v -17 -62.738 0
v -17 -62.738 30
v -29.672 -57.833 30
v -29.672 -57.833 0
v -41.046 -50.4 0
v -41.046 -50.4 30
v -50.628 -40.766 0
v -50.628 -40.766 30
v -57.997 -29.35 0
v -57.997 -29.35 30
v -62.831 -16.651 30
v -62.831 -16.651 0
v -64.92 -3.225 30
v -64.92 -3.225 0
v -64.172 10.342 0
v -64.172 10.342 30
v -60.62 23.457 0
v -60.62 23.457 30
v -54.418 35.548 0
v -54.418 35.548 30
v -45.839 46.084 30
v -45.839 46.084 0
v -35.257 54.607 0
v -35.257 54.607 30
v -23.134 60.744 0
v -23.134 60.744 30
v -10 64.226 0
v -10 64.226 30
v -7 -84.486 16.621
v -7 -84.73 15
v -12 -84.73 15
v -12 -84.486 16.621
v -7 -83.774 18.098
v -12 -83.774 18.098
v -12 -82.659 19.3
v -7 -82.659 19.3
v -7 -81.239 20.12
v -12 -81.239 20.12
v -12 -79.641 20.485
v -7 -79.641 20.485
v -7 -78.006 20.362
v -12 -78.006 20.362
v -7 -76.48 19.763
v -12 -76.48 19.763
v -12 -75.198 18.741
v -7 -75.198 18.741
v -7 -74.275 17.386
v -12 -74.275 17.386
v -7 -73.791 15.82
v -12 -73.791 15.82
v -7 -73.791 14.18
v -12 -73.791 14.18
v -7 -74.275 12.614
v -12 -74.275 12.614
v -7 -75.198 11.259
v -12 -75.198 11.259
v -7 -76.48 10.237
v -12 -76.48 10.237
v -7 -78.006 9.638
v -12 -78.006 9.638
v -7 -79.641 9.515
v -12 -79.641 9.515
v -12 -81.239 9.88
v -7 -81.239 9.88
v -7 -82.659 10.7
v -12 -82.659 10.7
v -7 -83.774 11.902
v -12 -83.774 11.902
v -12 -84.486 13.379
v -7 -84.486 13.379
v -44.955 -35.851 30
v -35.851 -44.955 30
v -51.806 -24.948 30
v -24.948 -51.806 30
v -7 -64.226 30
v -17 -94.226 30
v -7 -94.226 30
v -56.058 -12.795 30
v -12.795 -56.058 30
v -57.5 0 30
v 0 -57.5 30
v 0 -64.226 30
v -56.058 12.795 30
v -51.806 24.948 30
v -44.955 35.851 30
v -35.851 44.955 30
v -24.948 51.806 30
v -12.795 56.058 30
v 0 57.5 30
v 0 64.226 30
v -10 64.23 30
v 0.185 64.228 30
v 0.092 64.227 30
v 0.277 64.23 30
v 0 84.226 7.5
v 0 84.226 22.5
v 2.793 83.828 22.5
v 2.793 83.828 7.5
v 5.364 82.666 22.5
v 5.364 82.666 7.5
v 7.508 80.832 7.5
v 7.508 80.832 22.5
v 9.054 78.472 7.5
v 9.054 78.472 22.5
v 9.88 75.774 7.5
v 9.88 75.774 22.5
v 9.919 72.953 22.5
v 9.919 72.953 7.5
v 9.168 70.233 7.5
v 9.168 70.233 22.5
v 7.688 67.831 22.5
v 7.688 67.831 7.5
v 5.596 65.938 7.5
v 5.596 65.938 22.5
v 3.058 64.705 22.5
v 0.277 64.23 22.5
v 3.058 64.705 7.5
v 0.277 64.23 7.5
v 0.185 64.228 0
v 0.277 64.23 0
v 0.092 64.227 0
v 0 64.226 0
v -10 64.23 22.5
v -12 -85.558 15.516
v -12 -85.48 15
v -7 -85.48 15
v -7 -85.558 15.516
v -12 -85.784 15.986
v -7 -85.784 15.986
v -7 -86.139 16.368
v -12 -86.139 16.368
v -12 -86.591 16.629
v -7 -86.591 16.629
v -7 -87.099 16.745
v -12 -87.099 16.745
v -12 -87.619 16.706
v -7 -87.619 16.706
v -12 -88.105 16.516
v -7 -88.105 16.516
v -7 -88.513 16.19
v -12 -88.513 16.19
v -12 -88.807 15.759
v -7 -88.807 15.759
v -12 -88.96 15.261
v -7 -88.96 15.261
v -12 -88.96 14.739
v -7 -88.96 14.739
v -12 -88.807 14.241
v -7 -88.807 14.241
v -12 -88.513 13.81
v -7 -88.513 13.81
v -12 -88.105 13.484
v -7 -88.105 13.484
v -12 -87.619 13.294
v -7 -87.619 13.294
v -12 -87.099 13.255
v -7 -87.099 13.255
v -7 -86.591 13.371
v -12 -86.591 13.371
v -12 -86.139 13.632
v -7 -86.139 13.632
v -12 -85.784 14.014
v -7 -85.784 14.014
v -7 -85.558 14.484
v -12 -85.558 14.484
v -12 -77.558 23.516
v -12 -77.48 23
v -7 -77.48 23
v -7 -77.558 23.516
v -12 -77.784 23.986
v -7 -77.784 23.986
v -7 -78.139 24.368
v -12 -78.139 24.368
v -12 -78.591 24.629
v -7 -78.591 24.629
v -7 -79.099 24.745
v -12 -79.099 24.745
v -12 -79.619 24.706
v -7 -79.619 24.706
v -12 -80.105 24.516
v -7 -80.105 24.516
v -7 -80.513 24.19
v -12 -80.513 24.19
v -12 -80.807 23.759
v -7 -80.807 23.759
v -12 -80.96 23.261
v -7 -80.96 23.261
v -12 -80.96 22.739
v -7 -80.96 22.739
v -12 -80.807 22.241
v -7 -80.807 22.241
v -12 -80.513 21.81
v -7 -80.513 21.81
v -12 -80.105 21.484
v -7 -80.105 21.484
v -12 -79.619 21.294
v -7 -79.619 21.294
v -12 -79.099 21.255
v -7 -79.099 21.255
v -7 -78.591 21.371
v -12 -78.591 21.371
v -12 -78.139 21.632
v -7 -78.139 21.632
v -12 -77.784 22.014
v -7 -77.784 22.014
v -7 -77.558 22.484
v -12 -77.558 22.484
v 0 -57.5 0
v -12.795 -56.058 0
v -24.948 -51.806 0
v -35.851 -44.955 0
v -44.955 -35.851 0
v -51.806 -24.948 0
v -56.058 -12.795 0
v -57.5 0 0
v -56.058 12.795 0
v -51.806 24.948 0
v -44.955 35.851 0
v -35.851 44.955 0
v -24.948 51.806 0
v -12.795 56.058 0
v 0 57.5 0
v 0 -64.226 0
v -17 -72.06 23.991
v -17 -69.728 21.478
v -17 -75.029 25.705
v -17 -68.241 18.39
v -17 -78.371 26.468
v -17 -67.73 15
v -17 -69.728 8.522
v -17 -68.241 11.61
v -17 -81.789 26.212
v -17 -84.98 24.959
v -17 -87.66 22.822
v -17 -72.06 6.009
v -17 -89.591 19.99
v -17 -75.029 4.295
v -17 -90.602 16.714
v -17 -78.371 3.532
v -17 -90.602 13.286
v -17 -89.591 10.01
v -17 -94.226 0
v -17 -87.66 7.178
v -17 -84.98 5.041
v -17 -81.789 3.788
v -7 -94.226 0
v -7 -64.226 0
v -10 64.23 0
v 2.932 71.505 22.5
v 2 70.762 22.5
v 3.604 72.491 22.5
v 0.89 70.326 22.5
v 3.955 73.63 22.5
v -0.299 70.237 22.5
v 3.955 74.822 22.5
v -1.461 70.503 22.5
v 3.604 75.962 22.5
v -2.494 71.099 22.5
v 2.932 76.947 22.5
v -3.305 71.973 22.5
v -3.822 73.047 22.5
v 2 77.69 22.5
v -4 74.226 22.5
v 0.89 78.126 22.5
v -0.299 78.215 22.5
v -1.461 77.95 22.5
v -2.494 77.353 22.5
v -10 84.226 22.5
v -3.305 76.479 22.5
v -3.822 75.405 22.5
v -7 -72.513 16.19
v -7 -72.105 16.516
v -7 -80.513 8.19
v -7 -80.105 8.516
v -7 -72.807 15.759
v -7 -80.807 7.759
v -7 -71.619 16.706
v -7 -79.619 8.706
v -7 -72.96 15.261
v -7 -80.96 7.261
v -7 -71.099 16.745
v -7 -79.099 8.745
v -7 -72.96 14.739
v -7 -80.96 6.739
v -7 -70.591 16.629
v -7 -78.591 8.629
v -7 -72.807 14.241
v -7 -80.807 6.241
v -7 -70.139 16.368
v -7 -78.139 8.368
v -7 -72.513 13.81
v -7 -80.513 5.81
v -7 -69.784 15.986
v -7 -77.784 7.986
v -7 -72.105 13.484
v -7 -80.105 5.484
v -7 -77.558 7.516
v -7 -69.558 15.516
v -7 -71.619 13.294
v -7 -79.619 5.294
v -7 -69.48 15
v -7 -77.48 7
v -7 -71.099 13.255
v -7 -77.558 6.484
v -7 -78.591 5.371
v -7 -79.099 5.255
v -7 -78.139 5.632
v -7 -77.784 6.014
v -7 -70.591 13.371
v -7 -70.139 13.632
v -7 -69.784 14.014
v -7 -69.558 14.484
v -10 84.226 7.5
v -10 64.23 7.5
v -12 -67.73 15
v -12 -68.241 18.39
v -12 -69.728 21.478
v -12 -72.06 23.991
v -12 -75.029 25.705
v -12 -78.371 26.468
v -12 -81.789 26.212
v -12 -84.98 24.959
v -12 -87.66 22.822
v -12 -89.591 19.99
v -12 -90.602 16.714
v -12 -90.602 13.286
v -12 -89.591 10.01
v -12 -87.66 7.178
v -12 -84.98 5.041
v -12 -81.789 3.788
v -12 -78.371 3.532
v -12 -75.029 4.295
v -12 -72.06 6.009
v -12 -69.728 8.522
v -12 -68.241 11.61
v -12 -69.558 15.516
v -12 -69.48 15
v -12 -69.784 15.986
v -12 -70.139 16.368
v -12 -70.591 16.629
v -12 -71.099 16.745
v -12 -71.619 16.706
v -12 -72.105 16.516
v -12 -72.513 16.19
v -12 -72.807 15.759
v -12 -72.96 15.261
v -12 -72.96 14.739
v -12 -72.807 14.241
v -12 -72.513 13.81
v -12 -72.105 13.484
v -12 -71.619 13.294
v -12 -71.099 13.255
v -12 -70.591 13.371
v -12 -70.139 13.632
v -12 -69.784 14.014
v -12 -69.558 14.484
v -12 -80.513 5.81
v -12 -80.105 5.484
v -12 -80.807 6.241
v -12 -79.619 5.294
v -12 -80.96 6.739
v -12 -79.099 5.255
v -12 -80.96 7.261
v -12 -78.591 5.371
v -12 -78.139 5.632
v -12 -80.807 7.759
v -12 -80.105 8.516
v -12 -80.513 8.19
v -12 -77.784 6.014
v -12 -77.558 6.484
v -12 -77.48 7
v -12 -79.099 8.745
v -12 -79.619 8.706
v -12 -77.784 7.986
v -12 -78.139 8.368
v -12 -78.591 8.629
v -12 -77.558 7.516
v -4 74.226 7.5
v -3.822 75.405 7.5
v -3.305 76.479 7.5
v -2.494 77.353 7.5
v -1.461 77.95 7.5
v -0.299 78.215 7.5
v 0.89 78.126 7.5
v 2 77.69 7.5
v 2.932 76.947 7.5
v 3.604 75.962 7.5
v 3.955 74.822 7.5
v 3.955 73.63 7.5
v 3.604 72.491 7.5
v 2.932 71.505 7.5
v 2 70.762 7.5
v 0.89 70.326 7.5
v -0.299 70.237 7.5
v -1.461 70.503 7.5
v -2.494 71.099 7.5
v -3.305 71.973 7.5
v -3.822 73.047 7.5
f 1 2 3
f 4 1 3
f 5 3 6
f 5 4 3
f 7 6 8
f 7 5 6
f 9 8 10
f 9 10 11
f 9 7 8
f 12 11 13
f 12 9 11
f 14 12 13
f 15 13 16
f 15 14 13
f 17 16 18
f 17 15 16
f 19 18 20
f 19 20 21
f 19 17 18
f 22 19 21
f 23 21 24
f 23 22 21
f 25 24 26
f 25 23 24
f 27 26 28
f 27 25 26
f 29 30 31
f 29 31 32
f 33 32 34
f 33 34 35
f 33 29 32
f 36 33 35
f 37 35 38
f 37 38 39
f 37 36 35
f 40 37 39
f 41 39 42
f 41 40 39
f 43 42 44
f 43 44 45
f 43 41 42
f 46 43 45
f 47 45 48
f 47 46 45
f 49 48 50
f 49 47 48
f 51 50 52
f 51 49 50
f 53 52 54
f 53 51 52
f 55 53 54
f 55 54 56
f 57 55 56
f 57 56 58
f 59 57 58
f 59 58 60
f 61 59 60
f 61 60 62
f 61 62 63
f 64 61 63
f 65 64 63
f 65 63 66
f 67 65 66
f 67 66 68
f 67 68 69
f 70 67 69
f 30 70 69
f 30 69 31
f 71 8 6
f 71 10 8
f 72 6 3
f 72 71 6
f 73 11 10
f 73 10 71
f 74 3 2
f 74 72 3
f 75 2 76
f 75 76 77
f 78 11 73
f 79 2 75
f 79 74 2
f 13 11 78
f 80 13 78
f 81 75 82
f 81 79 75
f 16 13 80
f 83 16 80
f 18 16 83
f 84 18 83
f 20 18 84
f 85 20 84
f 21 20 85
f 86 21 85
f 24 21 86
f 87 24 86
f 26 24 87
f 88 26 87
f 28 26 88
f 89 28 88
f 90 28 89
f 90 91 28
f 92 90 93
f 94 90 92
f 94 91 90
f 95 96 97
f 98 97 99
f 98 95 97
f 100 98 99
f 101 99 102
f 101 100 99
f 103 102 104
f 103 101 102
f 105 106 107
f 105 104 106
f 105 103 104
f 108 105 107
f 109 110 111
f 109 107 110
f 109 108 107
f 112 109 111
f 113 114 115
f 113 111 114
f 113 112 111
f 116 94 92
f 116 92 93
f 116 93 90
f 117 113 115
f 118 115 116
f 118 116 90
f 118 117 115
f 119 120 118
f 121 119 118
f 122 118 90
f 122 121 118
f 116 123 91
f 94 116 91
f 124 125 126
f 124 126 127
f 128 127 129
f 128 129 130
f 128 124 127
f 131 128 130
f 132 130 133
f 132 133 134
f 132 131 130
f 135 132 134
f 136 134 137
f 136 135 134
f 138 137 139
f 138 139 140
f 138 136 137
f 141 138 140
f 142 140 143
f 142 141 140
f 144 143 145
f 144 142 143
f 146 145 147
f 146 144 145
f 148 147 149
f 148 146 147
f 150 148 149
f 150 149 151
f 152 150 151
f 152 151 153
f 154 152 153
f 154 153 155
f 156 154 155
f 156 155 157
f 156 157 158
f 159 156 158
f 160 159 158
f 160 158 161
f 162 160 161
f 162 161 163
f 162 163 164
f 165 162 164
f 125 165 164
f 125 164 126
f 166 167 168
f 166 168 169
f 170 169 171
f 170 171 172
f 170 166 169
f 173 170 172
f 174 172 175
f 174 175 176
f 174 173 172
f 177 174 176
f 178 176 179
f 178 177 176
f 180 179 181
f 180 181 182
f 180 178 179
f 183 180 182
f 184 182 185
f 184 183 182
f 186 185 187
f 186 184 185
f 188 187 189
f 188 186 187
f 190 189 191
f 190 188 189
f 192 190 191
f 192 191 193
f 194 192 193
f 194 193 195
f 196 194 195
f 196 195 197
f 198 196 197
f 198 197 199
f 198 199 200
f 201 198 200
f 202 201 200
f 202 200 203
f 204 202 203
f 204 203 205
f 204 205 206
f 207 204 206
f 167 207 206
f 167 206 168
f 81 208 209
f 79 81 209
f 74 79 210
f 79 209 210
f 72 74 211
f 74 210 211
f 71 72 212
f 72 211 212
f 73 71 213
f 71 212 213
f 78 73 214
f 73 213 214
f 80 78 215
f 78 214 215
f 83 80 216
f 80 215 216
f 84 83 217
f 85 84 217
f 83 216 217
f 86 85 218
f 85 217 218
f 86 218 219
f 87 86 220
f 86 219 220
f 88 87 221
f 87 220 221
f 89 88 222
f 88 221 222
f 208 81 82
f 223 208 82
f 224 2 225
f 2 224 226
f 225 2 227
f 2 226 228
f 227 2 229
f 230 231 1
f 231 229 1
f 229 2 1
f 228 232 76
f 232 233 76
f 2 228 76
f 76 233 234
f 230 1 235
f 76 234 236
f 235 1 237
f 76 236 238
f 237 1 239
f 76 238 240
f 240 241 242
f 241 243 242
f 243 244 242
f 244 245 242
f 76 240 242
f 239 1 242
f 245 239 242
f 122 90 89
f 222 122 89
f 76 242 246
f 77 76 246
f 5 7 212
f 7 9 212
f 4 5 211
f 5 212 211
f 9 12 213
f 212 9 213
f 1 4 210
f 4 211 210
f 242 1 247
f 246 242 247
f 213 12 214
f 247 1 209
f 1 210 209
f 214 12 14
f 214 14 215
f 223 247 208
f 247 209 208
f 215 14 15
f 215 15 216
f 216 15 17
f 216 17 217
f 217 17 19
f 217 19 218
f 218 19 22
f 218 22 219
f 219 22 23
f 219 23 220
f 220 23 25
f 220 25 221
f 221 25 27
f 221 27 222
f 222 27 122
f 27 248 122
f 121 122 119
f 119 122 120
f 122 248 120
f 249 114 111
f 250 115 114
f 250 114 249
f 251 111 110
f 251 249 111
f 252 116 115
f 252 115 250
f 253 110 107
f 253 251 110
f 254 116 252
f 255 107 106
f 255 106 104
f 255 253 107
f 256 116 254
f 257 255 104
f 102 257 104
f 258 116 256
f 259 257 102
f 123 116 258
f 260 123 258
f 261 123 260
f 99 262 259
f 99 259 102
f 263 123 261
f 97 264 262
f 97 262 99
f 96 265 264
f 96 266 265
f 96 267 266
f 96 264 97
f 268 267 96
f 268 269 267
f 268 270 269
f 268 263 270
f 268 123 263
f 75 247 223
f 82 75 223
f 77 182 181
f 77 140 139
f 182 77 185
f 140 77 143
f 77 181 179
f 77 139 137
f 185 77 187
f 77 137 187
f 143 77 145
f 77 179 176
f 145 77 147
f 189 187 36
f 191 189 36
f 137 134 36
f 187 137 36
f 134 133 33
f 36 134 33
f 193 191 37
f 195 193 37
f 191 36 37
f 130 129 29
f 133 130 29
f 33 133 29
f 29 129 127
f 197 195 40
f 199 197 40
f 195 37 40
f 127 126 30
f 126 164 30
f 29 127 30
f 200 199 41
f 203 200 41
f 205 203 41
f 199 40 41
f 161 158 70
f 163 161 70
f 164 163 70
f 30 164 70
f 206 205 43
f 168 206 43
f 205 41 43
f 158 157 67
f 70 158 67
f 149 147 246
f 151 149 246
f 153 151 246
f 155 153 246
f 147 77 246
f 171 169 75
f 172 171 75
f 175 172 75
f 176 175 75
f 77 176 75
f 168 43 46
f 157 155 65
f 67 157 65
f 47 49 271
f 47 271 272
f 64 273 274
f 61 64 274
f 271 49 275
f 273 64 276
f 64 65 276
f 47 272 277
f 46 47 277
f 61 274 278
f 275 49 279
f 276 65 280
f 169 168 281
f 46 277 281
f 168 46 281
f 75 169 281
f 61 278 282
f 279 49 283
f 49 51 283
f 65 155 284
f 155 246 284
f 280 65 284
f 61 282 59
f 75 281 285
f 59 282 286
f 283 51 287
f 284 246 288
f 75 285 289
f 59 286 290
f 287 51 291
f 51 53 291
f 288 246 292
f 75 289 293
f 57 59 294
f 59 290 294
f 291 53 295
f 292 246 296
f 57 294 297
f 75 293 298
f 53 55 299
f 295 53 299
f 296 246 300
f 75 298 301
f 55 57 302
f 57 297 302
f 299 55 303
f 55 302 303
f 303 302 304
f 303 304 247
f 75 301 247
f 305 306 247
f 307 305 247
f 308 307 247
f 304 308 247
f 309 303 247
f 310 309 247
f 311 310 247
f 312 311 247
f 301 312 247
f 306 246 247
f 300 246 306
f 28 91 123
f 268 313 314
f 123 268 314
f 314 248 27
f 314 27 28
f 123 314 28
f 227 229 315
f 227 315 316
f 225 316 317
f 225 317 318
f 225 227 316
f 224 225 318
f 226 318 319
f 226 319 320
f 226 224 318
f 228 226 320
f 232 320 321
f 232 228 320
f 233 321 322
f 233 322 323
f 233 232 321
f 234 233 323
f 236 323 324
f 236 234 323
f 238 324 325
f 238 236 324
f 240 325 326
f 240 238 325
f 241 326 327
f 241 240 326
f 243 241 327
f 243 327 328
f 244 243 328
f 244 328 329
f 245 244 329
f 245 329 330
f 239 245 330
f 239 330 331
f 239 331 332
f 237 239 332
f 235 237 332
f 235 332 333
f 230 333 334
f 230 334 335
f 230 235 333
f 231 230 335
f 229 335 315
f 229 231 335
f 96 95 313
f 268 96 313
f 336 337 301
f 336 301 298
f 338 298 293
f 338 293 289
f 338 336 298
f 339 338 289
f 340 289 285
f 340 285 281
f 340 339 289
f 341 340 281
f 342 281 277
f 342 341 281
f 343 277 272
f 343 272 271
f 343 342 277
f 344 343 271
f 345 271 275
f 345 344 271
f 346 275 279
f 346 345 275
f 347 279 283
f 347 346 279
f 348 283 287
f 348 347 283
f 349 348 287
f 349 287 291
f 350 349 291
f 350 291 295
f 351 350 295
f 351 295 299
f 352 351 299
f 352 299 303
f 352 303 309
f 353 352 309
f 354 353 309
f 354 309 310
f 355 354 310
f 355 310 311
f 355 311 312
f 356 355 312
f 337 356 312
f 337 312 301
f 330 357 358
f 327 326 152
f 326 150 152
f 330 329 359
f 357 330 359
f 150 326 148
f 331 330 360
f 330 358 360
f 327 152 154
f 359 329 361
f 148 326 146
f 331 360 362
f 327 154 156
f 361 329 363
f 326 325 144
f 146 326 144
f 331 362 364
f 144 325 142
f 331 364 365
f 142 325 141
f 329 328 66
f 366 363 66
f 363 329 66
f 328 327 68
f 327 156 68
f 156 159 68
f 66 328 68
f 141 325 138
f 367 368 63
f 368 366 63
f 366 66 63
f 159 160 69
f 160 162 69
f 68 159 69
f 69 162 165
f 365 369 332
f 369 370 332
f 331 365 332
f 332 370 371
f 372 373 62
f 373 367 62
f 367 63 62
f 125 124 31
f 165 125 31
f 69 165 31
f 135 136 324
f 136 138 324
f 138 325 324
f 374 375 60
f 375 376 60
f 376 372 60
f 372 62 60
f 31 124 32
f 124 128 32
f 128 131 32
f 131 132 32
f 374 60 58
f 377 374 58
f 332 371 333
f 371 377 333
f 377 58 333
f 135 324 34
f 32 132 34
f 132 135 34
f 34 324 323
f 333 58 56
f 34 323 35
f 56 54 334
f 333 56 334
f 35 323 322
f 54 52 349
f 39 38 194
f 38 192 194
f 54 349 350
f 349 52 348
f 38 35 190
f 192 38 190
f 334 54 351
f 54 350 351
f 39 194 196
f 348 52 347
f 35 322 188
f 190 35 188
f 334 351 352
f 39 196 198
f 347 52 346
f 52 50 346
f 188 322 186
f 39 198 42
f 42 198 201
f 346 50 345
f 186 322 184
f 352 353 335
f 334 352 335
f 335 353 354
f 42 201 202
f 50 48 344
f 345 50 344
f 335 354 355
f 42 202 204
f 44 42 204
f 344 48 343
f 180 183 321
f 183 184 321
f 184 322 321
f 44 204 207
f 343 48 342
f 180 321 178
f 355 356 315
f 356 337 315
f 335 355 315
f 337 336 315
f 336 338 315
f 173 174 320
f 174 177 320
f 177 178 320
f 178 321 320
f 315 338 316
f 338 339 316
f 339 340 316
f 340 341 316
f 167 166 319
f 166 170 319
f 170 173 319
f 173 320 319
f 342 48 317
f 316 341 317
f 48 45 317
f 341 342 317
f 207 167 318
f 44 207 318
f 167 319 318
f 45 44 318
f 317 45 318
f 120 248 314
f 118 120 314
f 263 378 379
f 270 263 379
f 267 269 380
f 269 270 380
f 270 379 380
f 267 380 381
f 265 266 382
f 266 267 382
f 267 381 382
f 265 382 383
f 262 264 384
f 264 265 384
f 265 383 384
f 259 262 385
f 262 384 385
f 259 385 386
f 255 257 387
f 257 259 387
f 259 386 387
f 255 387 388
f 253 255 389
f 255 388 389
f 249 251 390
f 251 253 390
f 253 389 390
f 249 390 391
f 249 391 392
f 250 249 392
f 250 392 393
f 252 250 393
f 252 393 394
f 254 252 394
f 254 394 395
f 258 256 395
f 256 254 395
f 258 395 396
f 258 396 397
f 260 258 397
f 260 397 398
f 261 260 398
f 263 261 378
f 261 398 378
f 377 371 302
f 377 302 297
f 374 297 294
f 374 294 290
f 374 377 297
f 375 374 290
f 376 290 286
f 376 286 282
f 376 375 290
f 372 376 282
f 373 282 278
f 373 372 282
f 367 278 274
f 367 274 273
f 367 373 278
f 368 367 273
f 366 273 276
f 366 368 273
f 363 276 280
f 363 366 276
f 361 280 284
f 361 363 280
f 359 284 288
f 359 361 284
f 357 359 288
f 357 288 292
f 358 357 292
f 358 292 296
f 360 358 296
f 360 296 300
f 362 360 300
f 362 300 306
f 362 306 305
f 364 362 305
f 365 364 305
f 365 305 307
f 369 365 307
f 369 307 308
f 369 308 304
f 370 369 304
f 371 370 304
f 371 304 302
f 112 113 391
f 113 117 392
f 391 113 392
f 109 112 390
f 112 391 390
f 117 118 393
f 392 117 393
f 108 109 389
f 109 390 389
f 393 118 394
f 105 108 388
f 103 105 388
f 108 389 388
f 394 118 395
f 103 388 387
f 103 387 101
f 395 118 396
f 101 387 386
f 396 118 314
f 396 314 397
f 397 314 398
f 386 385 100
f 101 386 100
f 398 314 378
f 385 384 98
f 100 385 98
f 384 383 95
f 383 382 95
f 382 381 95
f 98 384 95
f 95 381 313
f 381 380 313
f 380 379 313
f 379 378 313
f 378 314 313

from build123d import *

# Parameters (mm, degrees)
SKETCH_R        = 4
PAD_DEPTH       = 30
SKETCH001_R     = 5.5
POCKET_DEPTH    = 10
SKETCH002_R     = 11.5
POCKET001_DEPTH = 5
SKETCH003_R     = 1.75
POCKET002_DEPTH = 22.001
SKETCH005_W     = 20
SKETCH005_H     = 7.5
POCKET004_DEPTH = 20.001


with BuildPart() as body:
    # Sketch → Pad (new body)
    with BuildSketch(Plane.XY):
        with BuildLine():
            ThreePointArc((0, -57.5), (57.5, 0), (0, 57.5))
            Line((0, 64.226163), (0, 57.5))
            ThreePointArc((0, 84.226163), (-10, 74.226163), (0, 64.226163))
            Line((0, 84.226163), (10, 84.226163))
            Line((10, 84.226163), (10, 64.226163))
            ThreePointArc((17, -62.737549), (64.901433, 3.578267), (10, 64.226163))
            Line((17, -62.737549), (17, -94.226163))
            Line((17, -94.226163), (7, -94.226163))
            Line((7, -94.226163), (7, -64.226163))
            Line((7, -64.226163), (0, -64.226163))
            Line((0, -57.5), (0, -64.226163))
        make_face()
        with Locations((0, 74.226163)):
            Circle(SKETCH_R, mode=Mode.SUBTRACT)
    extrude(amount=PAD_DEPTH)

    # Sketch001 (on Face9 of Pad) → Pocket (cut)
    with BuildSketch(Plane(origin=(7, 0, 0), x_dir=(0, -1, 0), z_dir=(-1, 0, 0))):
        with Locations((79.23, 15)):
            Circle(SKETCH001_R)
    extrude(amount=-POCKET_DEPTH, mode=Mode.SUBTRACT)

    # Sketch002 (on Face11 of Pocket) → Pocket001 (cut)
    with BuildSketch(Plane.YZ.offset(17)):
        with Locations((-79.23, 15)):
            Circle(SKETCH002_R)
    extrude(amount=-POCKET001_DEPTH, mode=Mode.SUBTRACT)

    # Sketch003 (on Face17 of Pocket001) → Pocket002 (cut, through all)
    with BuildSketch(Plane.YZ.offset(12)):
        with Locations((-87.23, 15)):
            Circle(SKETCH003_R)
        with Locations((-79.23, 23)):
            Circle(SKETCH003_R)
        with Locations((-71.23, 15)):
            Circle(SKETCH003_R)
        with Locations((-79.23, 7)):
            Circle(SKETCH003_R)
    extrude(amount=-POCKET002_DEPTH, mode=Mode.SUBTRACT)

    # Sketch005 (on Face9 of Pocket002) → Pocket004 (cut, through all)
    with BuildSketch(Plane.YZ.offset(10)):
        with Locations((74.23, 26.25)):
            Rectangle(SKETCH005_W, SKETCH005_H)
        with Locations((74.23, 3.75)):
            Rectangle(SKETCH005_W, SKETCH005_H)
    extrude(amount=-POCKET004_DEPTH, mode=Mode.SUBTRACT)


with BuildPart() as part_mirroring:
    # Part__Mirroring: instance of Body
    add(body.part.mirror(Plane(origin=(0, 0, 0), x_dir=(0, -1, 0), z_dir=(1, 0, 0))))


solid = part_mirroring.part
